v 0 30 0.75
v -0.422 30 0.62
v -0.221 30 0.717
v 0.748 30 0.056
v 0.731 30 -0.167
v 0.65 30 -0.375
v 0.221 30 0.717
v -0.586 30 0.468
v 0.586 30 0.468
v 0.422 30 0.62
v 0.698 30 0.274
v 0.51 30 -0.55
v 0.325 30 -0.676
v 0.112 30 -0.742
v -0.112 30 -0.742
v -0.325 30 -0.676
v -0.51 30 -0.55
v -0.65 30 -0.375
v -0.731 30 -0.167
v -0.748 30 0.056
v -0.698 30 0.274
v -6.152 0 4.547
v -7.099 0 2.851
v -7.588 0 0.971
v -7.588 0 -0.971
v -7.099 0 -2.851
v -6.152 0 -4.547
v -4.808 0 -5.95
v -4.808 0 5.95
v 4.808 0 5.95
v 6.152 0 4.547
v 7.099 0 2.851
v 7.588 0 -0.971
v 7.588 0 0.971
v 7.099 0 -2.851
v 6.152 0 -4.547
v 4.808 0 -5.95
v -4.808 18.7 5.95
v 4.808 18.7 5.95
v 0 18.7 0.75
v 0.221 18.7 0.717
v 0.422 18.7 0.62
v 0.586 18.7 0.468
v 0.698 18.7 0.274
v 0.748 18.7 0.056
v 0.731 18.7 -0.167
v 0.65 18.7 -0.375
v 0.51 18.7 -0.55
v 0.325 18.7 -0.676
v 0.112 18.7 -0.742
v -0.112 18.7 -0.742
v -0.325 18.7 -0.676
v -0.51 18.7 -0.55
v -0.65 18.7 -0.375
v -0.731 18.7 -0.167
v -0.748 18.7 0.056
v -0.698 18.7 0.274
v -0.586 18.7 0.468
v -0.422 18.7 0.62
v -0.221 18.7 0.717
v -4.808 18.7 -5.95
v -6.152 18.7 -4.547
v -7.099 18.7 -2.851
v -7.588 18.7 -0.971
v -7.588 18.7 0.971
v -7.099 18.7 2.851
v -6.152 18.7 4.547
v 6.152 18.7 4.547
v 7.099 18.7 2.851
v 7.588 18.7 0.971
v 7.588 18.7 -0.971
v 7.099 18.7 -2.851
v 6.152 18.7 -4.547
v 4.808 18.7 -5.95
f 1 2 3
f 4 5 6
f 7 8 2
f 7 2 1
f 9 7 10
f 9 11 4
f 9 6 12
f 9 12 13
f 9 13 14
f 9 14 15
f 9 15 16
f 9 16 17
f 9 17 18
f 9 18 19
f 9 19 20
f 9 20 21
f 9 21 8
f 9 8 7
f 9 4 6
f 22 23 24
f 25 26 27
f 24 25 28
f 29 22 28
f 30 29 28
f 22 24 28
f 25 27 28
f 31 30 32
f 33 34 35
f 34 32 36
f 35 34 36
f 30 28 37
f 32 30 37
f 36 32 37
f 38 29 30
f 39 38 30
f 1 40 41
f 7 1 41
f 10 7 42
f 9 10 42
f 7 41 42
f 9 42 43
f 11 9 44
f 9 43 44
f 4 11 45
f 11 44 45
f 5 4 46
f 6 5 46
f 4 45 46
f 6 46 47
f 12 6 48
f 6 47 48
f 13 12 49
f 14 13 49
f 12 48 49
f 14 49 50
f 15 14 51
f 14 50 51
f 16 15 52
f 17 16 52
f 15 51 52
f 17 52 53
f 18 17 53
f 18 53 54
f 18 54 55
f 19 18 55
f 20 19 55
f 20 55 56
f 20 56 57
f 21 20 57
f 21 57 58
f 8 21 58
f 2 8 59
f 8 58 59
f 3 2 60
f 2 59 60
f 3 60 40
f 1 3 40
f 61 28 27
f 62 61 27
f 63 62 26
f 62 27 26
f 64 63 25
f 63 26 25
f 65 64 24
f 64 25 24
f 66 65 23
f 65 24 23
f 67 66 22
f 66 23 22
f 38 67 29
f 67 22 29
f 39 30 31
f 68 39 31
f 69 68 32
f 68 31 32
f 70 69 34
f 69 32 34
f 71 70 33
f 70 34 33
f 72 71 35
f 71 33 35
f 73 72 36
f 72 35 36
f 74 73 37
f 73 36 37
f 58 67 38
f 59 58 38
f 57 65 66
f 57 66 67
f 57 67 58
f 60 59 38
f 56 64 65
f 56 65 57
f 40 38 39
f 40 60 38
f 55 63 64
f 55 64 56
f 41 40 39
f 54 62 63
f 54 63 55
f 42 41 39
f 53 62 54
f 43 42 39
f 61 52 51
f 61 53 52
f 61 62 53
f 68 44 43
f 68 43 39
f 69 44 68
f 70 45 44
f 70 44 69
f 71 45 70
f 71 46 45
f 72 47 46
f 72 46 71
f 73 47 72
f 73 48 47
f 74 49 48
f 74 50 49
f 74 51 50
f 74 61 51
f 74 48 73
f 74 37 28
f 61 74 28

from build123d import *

# Parameters (mm, degrees)
EXTRUDE_1_DEPTH = 18.7
SKETCH_2_R      = 0.75
EXTRUDE_2_DEPTH = 11.3


with BuildPart() as part:
    # 草图1 → 凸台-拉伸1 (new body)
    with BuildSketch(Plane(origin=(0, 0, 0), x_dir=(1, 0, 0), z_dir=(0, 1, 0))):
        with BuildLine():
            Line((4.808326112, 5.95), (-4.808326112, 5.95))
            ThreePointArc((-4.808326112, 5.95), (-7.65, 0), (-4.808326112, -5.95))
            Line((-4.808326112, -5.95), (4.808326112, -5.95))
            ThreePointArc((4.808326112, -5.95), (7.65, 0), (4.808326112, 5.95))
        make_face()
    extrude(amount=EXTRUDE_1_DEPTH)

    # 草图2 → 凸台-拉伸2 (add)
    with BuildSketch(Plane(origin=(0, 18.7, 0), x_dir=(1, 0, 0), z_dir=(0, 1, 0))):
        with Locations(Location((0, 0, 0), (0, 0, 270))):
            Circle(SKETCH_2_R)
    extrude(amount=EXTRUDE_2_DEPTH)


solid = part.part
